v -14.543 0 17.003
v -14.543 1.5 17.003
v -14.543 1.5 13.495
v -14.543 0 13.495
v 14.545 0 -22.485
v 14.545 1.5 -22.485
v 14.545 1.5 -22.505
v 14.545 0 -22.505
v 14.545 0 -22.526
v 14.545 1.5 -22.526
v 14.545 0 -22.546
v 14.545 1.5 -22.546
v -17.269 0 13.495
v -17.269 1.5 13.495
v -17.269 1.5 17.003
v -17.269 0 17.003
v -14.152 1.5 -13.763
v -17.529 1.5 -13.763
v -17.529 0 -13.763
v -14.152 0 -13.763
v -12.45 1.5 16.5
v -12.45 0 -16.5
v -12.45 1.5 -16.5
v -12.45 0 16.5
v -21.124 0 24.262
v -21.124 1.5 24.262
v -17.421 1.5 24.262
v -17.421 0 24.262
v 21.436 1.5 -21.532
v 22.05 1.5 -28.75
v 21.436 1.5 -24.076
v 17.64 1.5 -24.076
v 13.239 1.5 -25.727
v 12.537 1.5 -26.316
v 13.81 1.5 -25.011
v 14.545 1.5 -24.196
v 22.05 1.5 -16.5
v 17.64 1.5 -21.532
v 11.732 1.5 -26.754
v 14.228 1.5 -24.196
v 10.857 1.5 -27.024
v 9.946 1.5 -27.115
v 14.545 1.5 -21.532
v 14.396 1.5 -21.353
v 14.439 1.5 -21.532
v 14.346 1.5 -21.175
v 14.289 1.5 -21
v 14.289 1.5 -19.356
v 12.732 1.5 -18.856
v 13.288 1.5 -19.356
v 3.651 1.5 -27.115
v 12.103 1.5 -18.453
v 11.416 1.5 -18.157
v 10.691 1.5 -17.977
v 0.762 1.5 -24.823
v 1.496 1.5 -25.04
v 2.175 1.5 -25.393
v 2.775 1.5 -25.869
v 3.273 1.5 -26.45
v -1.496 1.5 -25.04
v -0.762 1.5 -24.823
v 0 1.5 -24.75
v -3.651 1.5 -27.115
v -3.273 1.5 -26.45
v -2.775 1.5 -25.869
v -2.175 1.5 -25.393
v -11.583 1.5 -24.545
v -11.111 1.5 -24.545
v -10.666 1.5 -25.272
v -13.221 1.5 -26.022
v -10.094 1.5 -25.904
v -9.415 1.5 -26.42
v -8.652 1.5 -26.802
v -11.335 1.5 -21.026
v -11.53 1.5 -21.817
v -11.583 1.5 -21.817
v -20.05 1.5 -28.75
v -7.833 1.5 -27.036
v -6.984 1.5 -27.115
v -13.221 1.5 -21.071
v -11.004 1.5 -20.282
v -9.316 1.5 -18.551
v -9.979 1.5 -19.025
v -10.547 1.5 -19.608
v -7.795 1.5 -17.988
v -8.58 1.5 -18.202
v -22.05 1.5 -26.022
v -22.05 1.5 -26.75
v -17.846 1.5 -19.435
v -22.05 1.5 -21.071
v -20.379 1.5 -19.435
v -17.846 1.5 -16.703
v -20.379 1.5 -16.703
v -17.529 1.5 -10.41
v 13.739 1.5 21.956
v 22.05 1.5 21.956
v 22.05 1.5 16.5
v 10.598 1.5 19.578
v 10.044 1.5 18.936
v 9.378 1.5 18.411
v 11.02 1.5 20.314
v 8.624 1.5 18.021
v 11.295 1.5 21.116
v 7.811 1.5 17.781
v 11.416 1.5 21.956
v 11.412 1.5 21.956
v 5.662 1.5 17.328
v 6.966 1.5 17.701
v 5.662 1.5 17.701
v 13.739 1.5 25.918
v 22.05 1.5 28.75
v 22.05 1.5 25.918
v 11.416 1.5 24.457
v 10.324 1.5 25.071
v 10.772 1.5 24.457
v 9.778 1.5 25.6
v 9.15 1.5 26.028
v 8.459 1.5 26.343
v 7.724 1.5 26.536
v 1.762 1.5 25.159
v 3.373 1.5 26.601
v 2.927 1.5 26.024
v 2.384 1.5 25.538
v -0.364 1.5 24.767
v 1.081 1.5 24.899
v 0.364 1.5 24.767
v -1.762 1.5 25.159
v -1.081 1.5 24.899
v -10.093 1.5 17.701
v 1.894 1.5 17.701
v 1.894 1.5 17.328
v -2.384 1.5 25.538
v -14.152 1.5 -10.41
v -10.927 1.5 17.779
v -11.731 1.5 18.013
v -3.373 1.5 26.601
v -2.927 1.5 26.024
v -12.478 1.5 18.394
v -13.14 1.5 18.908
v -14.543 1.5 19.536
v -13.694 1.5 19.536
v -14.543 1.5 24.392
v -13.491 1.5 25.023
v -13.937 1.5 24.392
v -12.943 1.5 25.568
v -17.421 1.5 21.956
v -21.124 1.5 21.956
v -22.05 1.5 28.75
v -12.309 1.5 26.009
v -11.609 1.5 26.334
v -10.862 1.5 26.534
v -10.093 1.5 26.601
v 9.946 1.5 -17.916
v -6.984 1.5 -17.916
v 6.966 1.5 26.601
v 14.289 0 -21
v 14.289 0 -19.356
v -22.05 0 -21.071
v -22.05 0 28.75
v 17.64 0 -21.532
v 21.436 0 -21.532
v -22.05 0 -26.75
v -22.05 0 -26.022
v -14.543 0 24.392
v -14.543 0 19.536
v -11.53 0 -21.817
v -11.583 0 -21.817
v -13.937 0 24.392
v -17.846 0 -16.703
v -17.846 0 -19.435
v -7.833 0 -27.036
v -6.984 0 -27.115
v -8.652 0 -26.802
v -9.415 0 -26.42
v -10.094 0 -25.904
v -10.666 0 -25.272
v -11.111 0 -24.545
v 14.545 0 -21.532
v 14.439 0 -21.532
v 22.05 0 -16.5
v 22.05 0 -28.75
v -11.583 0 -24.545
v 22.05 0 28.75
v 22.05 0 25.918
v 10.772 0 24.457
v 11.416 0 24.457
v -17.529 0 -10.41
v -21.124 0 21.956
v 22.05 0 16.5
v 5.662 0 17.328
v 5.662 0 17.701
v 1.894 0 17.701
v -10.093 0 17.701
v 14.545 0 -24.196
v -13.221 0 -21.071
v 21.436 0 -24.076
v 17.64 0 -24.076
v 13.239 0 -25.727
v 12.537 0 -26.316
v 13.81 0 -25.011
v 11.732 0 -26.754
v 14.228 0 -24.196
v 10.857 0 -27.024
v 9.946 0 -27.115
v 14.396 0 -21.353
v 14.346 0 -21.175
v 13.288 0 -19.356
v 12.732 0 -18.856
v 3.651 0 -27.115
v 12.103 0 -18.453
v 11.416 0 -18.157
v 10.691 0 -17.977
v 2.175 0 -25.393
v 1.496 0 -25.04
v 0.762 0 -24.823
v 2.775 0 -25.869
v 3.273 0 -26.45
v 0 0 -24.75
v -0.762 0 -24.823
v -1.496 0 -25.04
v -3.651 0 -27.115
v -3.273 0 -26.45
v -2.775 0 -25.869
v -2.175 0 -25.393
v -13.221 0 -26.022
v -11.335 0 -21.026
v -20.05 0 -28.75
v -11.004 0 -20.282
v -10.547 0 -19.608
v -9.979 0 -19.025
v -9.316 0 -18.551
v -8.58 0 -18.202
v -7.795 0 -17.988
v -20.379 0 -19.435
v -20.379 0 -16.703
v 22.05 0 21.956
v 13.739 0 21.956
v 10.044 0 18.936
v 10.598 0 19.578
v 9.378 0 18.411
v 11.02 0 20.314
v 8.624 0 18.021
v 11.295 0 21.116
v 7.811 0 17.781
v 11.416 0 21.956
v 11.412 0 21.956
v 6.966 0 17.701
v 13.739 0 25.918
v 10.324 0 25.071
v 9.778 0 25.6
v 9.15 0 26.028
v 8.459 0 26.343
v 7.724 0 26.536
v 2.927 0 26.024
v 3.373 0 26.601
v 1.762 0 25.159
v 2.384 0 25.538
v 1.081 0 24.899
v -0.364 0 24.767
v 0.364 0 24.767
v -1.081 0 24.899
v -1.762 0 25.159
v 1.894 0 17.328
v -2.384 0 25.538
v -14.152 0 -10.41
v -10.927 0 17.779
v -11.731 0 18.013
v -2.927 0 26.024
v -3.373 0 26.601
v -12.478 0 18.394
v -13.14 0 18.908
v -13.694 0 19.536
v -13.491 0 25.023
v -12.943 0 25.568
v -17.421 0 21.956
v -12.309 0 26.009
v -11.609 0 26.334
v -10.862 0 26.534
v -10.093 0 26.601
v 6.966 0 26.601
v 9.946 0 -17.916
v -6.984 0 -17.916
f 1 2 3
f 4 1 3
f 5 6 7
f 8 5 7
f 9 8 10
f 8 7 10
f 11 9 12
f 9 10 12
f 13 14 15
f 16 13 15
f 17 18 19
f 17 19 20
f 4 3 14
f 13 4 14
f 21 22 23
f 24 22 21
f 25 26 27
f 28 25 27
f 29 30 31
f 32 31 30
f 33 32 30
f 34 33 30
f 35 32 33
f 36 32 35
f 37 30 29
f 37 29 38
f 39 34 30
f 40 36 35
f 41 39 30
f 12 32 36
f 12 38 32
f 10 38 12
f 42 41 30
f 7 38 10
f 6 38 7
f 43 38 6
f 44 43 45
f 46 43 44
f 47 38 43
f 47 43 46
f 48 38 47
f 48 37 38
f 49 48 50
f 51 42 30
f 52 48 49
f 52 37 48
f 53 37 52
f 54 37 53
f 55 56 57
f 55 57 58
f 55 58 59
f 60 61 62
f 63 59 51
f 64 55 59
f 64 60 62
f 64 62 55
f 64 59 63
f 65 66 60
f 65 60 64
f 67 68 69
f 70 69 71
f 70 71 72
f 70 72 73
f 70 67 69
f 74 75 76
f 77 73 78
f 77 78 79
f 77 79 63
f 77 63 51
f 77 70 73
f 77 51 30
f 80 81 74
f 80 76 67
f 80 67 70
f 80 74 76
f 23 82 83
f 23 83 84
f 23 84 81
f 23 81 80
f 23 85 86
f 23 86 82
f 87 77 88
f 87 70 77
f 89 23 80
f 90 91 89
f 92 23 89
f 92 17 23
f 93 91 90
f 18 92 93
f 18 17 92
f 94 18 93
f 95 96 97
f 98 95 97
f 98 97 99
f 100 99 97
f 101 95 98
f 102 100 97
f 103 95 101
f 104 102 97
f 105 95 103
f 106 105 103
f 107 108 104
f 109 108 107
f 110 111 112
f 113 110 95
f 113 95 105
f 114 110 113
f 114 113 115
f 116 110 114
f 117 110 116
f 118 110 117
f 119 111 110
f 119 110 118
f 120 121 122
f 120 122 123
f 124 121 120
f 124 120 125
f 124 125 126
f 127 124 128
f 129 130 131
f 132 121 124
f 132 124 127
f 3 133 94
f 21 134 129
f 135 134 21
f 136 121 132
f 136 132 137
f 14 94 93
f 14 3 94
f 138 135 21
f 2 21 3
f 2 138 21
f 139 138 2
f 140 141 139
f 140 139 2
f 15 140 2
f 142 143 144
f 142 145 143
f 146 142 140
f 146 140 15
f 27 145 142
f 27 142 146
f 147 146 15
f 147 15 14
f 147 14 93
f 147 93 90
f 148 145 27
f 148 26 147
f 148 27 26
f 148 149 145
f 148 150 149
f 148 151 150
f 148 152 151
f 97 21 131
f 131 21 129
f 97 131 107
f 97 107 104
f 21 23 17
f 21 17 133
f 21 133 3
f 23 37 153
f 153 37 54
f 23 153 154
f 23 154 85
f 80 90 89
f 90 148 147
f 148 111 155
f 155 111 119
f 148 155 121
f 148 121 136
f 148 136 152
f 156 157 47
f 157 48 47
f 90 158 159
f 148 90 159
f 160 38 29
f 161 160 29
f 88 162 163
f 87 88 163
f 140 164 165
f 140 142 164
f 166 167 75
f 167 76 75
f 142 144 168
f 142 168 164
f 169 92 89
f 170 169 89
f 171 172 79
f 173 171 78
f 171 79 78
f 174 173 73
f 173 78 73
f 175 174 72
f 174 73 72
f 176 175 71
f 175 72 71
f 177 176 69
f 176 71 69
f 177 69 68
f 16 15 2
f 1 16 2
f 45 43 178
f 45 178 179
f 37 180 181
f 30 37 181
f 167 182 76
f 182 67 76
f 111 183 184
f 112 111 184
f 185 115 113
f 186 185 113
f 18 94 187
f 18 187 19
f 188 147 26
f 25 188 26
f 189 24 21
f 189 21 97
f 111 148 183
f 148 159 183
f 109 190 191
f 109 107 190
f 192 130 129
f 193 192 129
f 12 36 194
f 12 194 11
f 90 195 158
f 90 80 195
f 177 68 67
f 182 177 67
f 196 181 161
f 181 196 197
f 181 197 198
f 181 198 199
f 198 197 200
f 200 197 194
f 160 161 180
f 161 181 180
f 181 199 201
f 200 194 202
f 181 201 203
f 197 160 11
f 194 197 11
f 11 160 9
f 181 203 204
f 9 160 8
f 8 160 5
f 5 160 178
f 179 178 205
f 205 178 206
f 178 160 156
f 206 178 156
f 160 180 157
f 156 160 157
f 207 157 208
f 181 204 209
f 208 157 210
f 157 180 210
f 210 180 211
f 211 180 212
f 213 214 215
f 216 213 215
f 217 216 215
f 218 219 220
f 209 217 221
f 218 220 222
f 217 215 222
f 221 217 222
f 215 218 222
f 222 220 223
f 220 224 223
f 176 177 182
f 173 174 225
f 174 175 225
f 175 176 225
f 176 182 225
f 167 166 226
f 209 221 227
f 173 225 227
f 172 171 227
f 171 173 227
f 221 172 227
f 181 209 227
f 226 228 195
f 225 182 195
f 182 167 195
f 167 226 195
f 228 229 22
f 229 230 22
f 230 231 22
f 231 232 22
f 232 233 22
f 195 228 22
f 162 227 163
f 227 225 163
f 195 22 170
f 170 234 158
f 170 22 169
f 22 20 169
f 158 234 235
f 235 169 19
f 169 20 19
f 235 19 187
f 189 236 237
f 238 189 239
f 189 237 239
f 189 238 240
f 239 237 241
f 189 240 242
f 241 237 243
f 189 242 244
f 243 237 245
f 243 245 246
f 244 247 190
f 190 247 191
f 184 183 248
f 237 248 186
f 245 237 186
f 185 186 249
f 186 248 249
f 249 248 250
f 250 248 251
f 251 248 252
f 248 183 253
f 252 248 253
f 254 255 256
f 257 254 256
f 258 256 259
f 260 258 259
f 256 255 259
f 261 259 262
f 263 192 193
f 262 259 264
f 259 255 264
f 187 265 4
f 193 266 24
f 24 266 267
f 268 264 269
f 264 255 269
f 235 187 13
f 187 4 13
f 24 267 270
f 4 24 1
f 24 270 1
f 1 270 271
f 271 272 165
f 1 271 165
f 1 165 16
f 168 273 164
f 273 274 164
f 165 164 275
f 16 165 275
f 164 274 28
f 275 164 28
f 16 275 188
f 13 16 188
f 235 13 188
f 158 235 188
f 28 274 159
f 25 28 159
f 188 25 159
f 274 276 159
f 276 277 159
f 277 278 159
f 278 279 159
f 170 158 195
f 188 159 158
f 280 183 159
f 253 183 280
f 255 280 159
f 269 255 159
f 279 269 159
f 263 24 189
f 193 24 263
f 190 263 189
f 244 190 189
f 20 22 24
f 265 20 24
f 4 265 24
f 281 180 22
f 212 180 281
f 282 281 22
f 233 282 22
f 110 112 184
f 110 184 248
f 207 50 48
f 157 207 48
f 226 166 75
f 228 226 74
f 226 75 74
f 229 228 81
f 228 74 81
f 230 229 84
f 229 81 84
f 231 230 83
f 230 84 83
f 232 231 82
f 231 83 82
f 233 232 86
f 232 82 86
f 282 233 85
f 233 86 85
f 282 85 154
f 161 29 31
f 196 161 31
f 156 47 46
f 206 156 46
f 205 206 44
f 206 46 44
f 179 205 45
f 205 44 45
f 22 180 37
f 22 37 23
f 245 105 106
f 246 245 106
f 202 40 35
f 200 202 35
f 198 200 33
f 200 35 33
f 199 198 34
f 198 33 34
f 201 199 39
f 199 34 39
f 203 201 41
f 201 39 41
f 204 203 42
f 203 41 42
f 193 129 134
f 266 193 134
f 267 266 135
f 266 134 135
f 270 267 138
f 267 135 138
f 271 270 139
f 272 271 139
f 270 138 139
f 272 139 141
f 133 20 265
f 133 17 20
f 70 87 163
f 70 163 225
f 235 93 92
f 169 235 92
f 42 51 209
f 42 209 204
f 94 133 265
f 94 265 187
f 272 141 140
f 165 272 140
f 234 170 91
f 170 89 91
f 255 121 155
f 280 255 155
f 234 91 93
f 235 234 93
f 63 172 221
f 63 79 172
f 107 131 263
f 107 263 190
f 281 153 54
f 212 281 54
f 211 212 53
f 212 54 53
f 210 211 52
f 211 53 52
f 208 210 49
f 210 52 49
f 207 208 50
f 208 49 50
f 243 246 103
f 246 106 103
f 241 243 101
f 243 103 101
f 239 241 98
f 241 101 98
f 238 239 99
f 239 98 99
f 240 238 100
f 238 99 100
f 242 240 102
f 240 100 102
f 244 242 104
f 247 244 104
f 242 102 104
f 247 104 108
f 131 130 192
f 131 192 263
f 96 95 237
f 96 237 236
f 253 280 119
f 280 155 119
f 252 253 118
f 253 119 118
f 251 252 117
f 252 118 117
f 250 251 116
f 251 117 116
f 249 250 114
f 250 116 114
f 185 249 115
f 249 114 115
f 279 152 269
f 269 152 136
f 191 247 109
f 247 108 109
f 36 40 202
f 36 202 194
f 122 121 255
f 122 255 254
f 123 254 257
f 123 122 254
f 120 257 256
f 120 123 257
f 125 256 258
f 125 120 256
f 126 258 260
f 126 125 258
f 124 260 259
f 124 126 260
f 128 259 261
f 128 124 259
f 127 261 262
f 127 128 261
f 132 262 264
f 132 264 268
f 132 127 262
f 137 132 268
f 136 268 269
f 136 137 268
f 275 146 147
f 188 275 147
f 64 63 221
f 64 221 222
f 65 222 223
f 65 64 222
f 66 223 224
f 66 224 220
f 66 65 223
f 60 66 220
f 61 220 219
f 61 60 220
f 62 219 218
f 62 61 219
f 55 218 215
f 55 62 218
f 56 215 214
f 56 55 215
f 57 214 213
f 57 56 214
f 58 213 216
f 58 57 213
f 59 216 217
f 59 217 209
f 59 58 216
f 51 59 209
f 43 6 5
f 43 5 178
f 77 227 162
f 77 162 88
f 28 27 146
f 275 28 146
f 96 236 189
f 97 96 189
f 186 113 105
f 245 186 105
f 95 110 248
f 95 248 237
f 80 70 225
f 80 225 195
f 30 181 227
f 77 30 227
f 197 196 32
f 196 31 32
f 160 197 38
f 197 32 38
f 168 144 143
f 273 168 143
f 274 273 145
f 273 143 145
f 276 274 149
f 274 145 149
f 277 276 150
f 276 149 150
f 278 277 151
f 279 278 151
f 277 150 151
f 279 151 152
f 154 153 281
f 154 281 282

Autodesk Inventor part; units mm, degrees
ref_plane "YZ Plane" through (0, 0, 0) normal (1, 0, 0) x (0, 1, 0)
ref_plane "XZ Plane" through (0, 0, 0) normal (0, 1, 0) x (-1, 0, 0)
ref_plane "XY Plane" through (0, 0, 0) normal (0, 0, 1) x (1, 0, 0)
sketch "Sketch1" plane through (0, 0, 0) normal (0, 1, 0) x (-1, 0, 0)
  line L0 (-22.05, -28.75) -> (22.05, -28.75)
  line L1 (22.05, -28.75) -> (22.05, 28.75)
  line L2 (22.05, 28.75) -> (-22.05, 28.75)
  line L3 (-22.05, 28.75) -> (-22.05, -28.75)
  line L4 (-22.05, -28.75) -> (22.05, 28.75) construction
  line L5 (22.05, -28.75) -> (-22.05, 28.75) construction
  point P0 (0, 0)
  dimension "d0" = 57.5
  dimension "d1" = 44.1
extrude "Extrusion1" add sketch "Sketch1" along normal blind 1.5
chamfer "Chamfer1" distance 2 angle 45 1 edges at (-22.05, 0.75, -28.75)
sketch "Sketch4" plane through (0, 1.5, 0) normal (0, 1, 0) x (1, 0, 0)
  line L0 (22.6381, -25.9185) -> (13.7388, -25.9185)
  line L1 (13.7388, -25.9185) -> (13.7388, -21.956)
  line L2 (13.7388, -21.956) -> (22.6381, -21.956)
  line L3 (22.6381, -21.956) -> (22.6381, -25.9185)
  line L4 (11.4165, -21.956) -> (0.7633, -21.956)
  line L5 (0.7633, -21.956) -> (0.7633, -24.4569)
  line L6 (0.7633, -24.4569) -> (11.4165, -24.4569)
  line L7 (11.4165, -24.4569) -> (11.4165, -21.956)
  line L8 (-0.6658, -26.6006) -> (-6.707, -26.6006)
  line L9 (-6.707, -26.6006) -> (-6.707, -22.3783)
  line L10 (-6.707, -22.3783) -> (-0.6658, -22.3783)
  line L11 (-0.6658, -22.3783) -> (-0.6658, -26.6006)
  line L12 (-6.707, -24.392) -> (-14.5426, -24.392)
  line L13 (-14.5426, -24.392) -> (-14.5426, -21.0953)
  line L14 (-14.5426, -21.0953) -> (-6.707, -21.0953)
  line L15 (-6.707, -21.0953) -> (-6.707, -24.392)
  line L16 (-14.5426, -21.0953) -> (-11.8996, -21.0953)
  line L17 (-11.8996, -21.0953) -> (-11.8996, -19.5363)
  line L18 (-11.8996, -19.5363) -> (-14.5426, -19.5363)
  line L19 (-14.5426, -19.5363) -> (-14.5426, -21.0953)
  line L20 (-21.1238, -24.2621) -> (-17.4211, -24.2621)
  line L21 (-17.4211, -24.2621) -> (-17.4211, -21.956)
  line L22 (-17.4211, -21.956) -> (-21.1238, -21.956)
  line L23 (-21.1238, -21.956) -> (-21.1238, -24.2621)
  line L24 (5.6616, -20.7705) -> (1.894, -20.7705)
  line L25 (1.894, -20.7705) -> (1.894, -17.3277)
  line L26 (1.894, -17.3277) -> (5.6616, -17.3277)
  line L27 (5.6616, -17.3277) -> (5.6616, -20.7705)
  line L28 (-2.848, -19.9261) -> (-5.2515, -19.9261)
  line L29 (-5.2515, -19.9261) -> (-5.2515, -18.3346)
  line L30 (-5.2515, -18.3346) -> (-2.848, -18.3346)
  line L31 (-2.848, -18.3346) -> (-2.848, -19.9261)
  line L32 (-17.2689, -17.0029) -> (-14.5426, -17.0029)
  line L33 (-14.5426, -17.0029) -> (-14.5426, -13.4952)
  line L34 (-14.5426, -13.4952) -> (-17.2689, -13.4952)
  line L35 (-17.2689, -13.4952) -> (-17.2689, -17.0029)
  line L36 (15.925, -11.4814) -> (12.4173, -11.4814)
  line L37 (12.4173, -11.4814) -> (12.4173, -14.7294)
  line L38 (12.4173, -14.7294) -> (15.925, -14.7294)
  line L39 (15.925, -14.7294) -> (15.925, -11.4814)
  line L40 (-2.1335, 9.0455) -> (1.894, 9.0455)
  line L41 (1.894, 9.0455) -> (1.894, -8.9481)
  line L42 (1.894, -8.9481) -> (-2.1335, -8.9481)
  line L43 (-2.1335, -8.9481) -> (-2.1335, 9.0455)
  line L44 (4.5573, 3.3291) -> (1.6991, 3.3291)
  line L45 (1.6991, 3.3291) -> (1.6991, 0.6009)
  line L46 (1.6991, 0.6009) -> (4.5573, 0.6009)
  line L47 (4.5573, 0.6009) -> (4.5573, 3.3291)
  line L48 (-17.5287, 13.7631) -> (-14.1519, 13.7631)
  line L49 (-14.1519, 13.7631) -> (-14.1519, 10.4096)
  line L50 (-14.1519, 10.4096) -> (-17.5287, 10.4096)
  line L51 (-17.5287, 10.4096) -> (-17.5287, 13.7631)
  line L52 (16.8052, 16.3739) -> (14.7212, 16.3739)
  line L53 (14.7212, 16.3739) -> (14.7212, 12.4259)
  line L54 (14.7212, 12.4259) -> (16.8052, 12.4259)
  line L55 (16.8052, 12.4259) -> (16.8052, 16.3739)
  line L56 (-23.3919, 26.0219) -> (-13.2211, 26.0219)
  line L57 (-13.2211, 26.0219) -> (-13.2211, 21.0711)
  line L58 (-13.2211, 21.0711) -> (-23.3919, 21.0711)
  line L59 (-23.3919, 21.0711) -> (-23.3919, 26.0219)
  line L60 (-20.3793, 16.7032) -> (-17.8455, 16.7032)
  line L61 (-17.8455, 16.7032) -> (-17.8455, 19.4346)
  line L62 (-17.8455, 19.4346) -> (-20.3793, 19.4346)
  line L63 (-20.3793, 19.4346) -> (-20.3793, 16.7032)
  line L64 (-11.5832, 21.8169) -> (-0.7032, 21.8169)
  line L65 (-0.7032, 21.8169) -> (-0.7032, 24.5446)
  line L66 (-0.7032, 24.5446) -> (-11.5832, 24.5446)
  line L67 (-11.5832, 24.5446) -> (-11.5832, 21.8169)
  line L68 (-2.5673, 18.6812) -> (-4.8458, 18.6812)
  line L69 (-4.8458, 18.6812) -> (-4.8458, 22.2038)
  line L70 (-4.8458, 22.2038) -> (-2.5673, 22.2038)
  line L71 (-2.5673, 22.2038) -> (-2.5673, 18.6812)
  line L72 (0.9146, 27.1153) -> (6.539, 27.1153)
  line L73 (6.539, 27.1153) -> (6.539, 22.2038)
  line L74 (6.539, 22.2038) -> (0.9146, 22.2038)
  line L75 (0.9146, 22.2038) -> (0.9146, 27.1153)
  line L76 (2.2307, 17.9158) -> (4.5573, 17.9158)
  line L77 (4.5573, 17.9158) -> (4.5573, 22.2038)
  line L78 (4.5573, 22.2038) -> (2.2307, 22.2038)
  line L79 (2.2307, 22.2038) -> (2.2307, 17.9158)
  line L80 (6.0899, 24.1958) -> (14.5454, 24.1958)
  line L81 (14.5454, 24.1958) -> (14.5454, 21.5323)
  line L82 (14.5454, 21.5323) -> (6.0899, 21.5323)
  line L83 (6.0899, 21.5323) -> (6.0899, 24.1958)
  line L84 (14.2886, 21.5323) -> (11.9019, 21.5323)
  line L85 (11.9019, 21.5323) -> (11.9019, 19.3557)
  line L86 (11.9019, 19.3557) -> (14.2886, 19.3557)
  line L87 (14.2886, 19.3557) -> (14.2886, 21.5323)
  line L88 (21.4363, 24.0758) -> (17.64, 24.0758)
  line L89 (17.64, 24.0758) -> (17.64, 21.5323)
  line L90 (17.64, 21.5323) -> (21.4363, 21.5323)
  line L91 (21.4363, 21.5323) -> (21.4363, 24.0758)
  point P0 (0, 0)
  point P1 (6.539, 24.1958)
  point P2 (6.0899, 22.2038)
extrude "Clearance Cutouts" cut sketch "Sketch4" against normal blind 1.5
sketch "Sketch5" plane through (0, 1.5, 0) normal (0, 1, 0) x (1, 0, 0)
  line L0 (9.9457, 22.5156) -> (-6.9835, 22.5156) construction
  line L1 (9.9457, 17.9158) -> (-6.9835, 17.9158)
  line L2 (-6.9835, 27.1153) -> (9.9457, 27.1153)
  arc A0 (9.9457, 17.9158) -> (9.9457, 27.1153) centre (9.9457, 22.5156) ccw
  arc A1 (-6.9835, 27.1153) -> (-6.9835, 17.9158) centre (-6.9835, 22.5156) ccw
  line L3 (-11.5832, 24.5446) -> (-0.7032, 24.5446) projected
  line L4 (0.9146, 22.2038) -> (0.9146, 27.1153) projected
  line L5 (-13.2211, 26.0219) -> (-13.2211, 21.0711) projected
  line L6 (-11.5832, 21.8169) -> (-11.5832, 24.5446) projected
  line L7 (14.5454, 24.1958) -> (14.5454, 21.5323) projected
  line L8 (-10.0926, -22.1506) -> (6.9665, -22.1506) construction
  line L9 (-10.0926, -26.6006) -> (6.9665, -26.6006)
  line L10 (6.9665, -17.7006) -> (-10.0926, -17.7006)
  arc A2 (-10.0926, -17.7006) -> (-10.0926, -26.6006) centre (-10.0926, -22.1506) ccw
  arc A3 (6.9665, -26.6006) -> (6.9665, -17.7006) centre (6.9665, -22.1506) ccw
  point P0 (0, 0)
  point P1 (1.4811, 22.5156)
  point P2 (14.5454, 22.5156)
  point P3 (-11.5832, 22.5156)
  point P4 (4.5573, 17.9158)
  point P5 (-1.5631, -22.1506)
  point P6 (-0.6658, -26.6006)
  point P7 (11.4165, -22.1506)
  point P8 (11.4165, -24.4569)
  point P9 (-14.5426, -22.1506)
  point P10 (-14.5426, -19.5363)
  dimension "d53" = 8.9
extrude "Extrusion4" cut sketch "Sketch5" against normal blind 1.5 contours L1 A1 L2 A0 | A2 L10 A3 L9
sketch "Sketch6" plane through (0, 0, 0) normal (0, -1, 0) x (1, 0, 0)
  line L0 (22.05, 21.956) -> (22.05, -28.75) projected
  line L1 (22.05, -16.5) -> (-12.45, -16.5)
  line L2 (-12.45, -16.5) -> (-12.45, 16.5)
  line L3 (-12.45, 16.5) -> (22.05, 16.5)
  line L4 (22.05, 16.5) -> (22.05, -16.5)
  point P0 (0, 0)
  point P1 (22.05, 16.5)
  dimension "d44" = 33
  dimension "d45" = 34.5
  dimension "d46" = 16.5
extrude "Extrusion5" cut sketch "Sketch6" against normal through all
sketch "Sketch7" plane through (0, 1.5, 0) normal (0, 1, 0) x (1, 0, 0)
  line L0 (-22.05, -28.75) -> (22.05, -28.75) projected
  arc A0 (4, -28.75) -> (-4, -28.75) centre (0, -28.75) ccw
  line L1 (22.05, 28.75) -> (-20.05, 28.75) projected
  arc A1 (-4, 28.75) -> (4, 28.75) centre (0, 28.75) ccw
  line L2 (22.05, 28.75) -> (-20.05, 28.75) projected
  point P0 (0, 0)
  point P1 (4, 28.75)
  dimension "d49" = 4
  dimension "d50" = 4
extrude "Extrusion6" add sketch "Sketch7" against normal up to surface (1.5 mm away)
equation "\"d46\" = 0.5 * d44"
equation "\"d50\" = d49"
properties part number "Flex Holder V1" material "Thermoplastic Resin"
